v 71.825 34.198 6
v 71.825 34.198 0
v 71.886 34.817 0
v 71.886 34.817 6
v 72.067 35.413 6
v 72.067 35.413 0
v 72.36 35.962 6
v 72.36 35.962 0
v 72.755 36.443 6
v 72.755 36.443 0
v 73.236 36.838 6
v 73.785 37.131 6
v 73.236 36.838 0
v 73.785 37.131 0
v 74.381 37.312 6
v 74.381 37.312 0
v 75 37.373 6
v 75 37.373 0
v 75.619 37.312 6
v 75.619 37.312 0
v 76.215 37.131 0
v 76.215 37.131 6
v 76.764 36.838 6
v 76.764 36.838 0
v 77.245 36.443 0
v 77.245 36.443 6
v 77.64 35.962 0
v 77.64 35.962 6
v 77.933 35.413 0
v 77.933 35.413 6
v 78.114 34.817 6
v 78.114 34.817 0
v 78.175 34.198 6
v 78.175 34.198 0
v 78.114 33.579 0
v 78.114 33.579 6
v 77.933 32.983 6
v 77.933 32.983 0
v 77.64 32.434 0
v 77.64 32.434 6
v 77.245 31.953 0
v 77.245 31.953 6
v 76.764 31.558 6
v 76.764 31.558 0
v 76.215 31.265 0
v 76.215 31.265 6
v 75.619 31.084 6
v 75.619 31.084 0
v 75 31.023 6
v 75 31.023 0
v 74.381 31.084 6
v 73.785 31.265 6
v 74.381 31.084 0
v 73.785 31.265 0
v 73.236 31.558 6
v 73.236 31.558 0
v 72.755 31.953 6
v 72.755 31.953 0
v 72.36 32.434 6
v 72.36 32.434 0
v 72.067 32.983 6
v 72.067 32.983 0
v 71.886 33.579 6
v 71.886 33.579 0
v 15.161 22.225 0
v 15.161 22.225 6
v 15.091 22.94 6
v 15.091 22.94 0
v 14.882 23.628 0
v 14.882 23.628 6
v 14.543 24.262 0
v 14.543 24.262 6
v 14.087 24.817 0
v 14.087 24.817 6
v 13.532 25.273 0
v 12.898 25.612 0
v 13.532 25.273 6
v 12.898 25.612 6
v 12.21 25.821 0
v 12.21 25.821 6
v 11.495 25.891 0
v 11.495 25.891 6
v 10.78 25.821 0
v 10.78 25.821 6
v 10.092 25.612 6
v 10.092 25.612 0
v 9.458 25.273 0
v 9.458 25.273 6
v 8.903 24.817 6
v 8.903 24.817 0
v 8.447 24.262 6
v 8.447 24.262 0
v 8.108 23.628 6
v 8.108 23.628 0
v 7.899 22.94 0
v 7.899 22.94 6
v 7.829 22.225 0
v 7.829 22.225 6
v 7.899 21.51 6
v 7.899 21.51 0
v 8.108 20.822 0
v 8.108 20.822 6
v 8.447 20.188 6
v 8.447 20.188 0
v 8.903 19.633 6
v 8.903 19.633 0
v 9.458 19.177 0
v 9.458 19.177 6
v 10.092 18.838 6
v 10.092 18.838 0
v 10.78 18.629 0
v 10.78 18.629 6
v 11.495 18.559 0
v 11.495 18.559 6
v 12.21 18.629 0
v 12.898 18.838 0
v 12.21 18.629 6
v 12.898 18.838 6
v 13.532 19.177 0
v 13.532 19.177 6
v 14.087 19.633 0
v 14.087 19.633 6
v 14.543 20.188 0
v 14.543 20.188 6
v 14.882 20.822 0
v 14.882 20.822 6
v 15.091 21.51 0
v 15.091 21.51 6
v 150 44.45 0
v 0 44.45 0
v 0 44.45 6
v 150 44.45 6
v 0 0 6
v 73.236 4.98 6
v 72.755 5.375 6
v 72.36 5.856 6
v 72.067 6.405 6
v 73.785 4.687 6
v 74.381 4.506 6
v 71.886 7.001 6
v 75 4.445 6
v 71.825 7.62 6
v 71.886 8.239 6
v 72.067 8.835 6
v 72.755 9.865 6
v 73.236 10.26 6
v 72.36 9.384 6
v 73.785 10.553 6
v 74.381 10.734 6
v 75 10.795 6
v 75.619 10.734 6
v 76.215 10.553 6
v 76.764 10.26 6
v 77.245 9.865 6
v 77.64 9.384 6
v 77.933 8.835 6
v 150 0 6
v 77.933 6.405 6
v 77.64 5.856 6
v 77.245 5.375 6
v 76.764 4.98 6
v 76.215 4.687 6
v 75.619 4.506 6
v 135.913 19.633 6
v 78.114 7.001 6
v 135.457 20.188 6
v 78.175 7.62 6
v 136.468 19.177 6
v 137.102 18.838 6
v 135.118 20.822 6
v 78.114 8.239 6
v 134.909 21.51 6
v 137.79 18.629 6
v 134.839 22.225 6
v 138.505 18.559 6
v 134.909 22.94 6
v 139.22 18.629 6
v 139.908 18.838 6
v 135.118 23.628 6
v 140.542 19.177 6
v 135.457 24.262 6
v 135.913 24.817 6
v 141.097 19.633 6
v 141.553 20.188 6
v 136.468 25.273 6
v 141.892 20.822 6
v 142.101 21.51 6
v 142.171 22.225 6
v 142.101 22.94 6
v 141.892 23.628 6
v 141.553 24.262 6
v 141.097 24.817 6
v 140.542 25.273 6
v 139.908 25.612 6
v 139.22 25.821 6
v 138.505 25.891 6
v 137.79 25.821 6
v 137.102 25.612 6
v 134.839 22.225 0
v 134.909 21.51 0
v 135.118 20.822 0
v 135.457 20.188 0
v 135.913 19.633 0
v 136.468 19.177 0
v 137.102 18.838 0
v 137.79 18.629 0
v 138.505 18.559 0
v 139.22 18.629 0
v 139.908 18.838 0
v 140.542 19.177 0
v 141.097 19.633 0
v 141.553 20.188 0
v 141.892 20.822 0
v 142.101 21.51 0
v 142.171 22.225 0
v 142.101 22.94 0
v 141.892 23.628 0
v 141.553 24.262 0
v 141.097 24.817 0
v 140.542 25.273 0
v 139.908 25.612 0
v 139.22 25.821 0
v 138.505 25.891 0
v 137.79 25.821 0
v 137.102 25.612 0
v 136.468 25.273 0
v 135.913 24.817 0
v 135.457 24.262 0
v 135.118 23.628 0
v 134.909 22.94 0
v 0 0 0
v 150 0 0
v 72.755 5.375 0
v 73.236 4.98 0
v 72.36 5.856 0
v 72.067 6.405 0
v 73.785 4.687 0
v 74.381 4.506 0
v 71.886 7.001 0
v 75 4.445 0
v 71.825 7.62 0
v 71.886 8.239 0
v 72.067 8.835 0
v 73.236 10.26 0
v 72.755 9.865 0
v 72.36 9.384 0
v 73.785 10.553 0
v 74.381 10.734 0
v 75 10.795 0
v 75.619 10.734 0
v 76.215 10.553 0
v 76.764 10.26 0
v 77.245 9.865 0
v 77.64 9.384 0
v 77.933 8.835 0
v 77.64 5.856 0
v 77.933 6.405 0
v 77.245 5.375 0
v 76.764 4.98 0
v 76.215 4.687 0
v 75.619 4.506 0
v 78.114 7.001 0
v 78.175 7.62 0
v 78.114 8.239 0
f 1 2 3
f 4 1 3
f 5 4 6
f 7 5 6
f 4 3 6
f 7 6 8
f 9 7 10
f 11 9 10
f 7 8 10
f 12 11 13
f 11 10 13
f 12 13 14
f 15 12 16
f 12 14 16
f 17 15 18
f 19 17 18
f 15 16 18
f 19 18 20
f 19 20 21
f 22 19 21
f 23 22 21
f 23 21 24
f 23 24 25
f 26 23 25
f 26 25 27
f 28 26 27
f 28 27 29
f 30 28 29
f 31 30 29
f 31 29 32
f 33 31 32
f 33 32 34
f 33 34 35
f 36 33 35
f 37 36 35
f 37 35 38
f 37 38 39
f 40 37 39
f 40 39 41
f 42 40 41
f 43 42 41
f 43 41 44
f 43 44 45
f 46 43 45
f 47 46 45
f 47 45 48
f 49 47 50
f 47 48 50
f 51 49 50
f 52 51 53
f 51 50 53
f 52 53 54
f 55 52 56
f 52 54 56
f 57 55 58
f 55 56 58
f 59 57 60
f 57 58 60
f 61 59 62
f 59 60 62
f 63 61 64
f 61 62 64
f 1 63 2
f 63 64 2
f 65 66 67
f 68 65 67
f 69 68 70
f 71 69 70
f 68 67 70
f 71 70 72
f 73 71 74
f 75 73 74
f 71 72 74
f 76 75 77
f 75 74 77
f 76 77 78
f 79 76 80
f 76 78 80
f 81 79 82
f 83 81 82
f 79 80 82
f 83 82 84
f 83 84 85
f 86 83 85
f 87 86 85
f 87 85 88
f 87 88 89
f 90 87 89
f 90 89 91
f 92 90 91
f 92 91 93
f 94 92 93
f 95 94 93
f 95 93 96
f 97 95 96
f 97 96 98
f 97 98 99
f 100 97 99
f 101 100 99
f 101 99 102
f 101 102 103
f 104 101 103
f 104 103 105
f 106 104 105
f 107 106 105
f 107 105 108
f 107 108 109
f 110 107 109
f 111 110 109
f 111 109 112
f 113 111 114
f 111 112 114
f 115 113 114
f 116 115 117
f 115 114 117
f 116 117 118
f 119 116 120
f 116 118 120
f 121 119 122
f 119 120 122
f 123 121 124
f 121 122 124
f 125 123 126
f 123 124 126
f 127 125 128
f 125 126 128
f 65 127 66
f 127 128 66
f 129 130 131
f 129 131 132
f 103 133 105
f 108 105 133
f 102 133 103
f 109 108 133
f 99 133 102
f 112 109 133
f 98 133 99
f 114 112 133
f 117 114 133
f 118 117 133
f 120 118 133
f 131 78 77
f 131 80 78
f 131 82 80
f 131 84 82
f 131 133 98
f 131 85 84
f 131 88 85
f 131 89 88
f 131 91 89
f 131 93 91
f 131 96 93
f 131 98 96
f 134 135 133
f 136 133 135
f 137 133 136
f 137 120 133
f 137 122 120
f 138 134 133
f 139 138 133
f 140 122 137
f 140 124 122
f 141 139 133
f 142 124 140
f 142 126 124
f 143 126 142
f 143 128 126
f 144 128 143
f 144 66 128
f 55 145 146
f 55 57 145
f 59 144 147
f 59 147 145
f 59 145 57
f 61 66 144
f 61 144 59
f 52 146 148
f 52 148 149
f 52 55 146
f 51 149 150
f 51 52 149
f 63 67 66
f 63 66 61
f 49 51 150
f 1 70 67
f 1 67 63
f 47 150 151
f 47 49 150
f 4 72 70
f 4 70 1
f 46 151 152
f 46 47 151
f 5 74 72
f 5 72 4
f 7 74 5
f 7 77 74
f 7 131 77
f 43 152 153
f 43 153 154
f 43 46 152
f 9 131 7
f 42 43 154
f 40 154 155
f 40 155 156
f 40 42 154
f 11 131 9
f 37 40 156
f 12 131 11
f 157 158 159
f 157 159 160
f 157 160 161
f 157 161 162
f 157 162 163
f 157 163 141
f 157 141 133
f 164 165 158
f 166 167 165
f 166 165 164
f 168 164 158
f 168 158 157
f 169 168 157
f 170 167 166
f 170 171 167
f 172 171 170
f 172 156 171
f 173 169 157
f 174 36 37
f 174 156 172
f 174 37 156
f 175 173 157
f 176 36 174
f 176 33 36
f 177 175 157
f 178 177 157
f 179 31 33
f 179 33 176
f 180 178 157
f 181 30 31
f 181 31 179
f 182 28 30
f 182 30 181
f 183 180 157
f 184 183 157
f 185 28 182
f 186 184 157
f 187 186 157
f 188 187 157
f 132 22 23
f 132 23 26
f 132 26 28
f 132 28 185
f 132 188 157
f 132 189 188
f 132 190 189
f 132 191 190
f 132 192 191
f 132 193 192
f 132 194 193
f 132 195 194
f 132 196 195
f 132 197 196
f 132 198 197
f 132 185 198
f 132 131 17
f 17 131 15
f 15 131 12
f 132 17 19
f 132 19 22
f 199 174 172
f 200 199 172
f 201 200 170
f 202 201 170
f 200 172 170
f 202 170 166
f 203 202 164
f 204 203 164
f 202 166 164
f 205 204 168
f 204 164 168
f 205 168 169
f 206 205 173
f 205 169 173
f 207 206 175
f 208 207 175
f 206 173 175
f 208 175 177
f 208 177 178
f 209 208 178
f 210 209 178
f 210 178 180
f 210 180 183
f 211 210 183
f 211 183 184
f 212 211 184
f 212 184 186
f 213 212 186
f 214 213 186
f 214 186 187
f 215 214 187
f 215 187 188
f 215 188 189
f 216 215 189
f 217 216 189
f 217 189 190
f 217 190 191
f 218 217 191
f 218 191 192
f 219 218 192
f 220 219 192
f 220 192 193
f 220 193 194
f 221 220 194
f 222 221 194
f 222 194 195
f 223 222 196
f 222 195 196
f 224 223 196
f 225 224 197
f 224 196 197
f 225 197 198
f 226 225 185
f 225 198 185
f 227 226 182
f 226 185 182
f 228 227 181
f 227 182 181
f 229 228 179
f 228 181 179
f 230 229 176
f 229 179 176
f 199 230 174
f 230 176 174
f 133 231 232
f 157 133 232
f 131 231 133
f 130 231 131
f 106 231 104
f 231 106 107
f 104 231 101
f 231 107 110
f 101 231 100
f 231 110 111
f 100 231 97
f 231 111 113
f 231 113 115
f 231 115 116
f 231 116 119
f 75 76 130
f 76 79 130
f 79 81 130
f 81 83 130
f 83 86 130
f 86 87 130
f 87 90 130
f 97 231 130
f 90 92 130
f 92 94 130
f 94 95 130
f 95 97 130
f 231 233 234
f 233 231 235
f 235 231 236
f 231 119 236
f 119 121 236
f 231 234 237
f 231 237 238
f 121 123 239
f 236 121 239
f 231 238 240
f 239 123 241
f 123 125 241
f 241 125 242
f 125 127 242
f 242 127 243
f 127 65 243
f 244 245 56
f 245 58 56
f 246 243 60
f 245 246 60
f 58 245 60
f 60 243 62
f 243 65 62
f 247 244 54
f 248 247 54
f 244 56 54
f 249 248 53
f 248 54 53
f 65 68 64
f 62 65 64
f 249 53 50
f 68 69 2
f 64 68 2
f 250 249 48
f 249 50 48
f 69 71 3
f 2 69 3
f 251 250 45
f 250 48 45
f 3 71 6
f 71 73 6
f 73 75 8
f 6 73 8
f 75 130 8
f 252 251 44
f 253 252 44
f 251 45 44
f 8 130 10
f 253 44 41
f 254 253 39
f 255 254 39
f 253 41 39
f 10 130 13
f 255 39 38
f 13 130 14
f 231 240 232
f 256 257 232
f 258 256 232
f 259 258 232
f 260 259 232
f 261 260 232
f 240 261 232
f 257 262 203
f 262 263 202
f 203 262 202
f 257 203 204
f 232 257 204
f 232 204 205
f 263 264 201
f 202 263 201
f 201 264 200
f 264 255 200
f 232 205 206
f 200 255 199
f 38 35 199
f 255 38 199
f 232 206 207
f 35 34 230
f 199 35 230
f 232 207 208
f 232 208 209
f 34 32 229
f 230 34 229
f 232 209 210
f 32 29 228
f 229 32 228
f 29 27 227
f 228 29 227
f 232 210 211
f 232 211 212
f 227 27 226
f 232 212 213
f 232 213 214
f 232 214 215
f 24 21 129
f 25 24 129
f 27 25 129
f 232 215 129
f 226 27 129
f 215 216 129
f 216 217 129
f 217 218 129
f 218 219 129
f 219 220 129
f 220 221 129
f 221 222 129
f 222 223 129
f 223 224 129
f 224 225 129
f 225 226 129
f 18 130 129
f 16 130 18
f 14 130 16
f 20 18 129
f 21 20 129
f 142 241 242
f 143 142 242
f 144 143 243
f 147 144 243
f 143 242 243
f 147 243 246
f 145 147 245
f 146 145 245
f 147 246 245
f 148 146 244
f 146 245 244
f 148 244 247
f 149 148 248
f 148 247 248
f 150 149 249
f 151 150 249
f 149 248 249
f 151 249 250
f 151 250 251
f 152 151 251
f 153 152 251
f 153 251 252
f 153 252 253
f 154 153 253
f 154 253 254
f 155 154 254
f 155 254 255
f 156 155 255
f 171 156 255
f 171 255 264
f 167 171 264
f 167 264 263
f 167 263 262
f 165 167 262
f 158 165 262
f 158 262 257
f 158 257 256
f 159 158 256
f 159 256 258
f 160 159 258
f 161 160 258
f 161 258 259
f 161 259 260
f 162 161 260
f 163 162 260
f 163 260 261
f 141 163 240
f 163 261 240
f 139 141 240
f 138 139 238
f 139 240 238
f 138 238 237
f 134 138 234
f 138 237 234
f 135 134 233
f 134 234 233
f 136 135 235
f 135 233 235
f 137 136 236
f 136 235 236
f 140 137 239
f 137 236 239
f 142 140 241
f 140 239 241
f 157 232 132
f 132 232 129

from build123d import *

# Parameters (mm, degrees)
SKETCH1_W           = 150
SKETCH1_H           = 44.45
BOSS_EXTRUDE1_DEPTH = 6
SKETCH2_R           = 3.666174209
CUT_EXTRUDE1_DEPTH  = 157.562455589
SKETCH3_R           = 3.175
CUT_EXTRUDE2_DEPTH  = 157.562455589


with BuildPart() as part:
    # Sketch1 → Boss-Extrude1 (new body)
    with BuildSketch(Plane.XY):
        with Locations((75, 22.225)):
            Rectangle(SKETCH1_W, SKETCH1_H)
    extrude(amount=BOSS_EXTRUDE1_DEPTH)

    # Sketch2 → Cut-Extrude1 (cut, through all)
    with BuildSketch(Plane.XY.offset(6)):
        with Locations((11.495, 22.225)):
            Circle(SKETCH2_R)
        with Locations(Location((138.505, 22.225, 0), (0, 0, 180))):
            Circle(SKETCH2_R)
    extrude(amount=-CUT_EXTRUDE1_DEPTH, mode=Mode.SUBTRACT)

    # Sketch3 → Cut-Extrude2 (cut, through all)
    with BuildSketch(Plane(origin=(0, 0, 0), x_dir=(-1, 0, 0), z_dir=(0, 0, -1))):
        with Locations((-75, 7.62)):
            Circle(SKETCH3_R)
        with Locations((-75, 34.197995036)):
            Circle(SKETCH3_R)
    extrude(amount=-CUT_EXTRUDE2_DEPTH, mode=Mode.SUBTRACT)


solid = part.part
